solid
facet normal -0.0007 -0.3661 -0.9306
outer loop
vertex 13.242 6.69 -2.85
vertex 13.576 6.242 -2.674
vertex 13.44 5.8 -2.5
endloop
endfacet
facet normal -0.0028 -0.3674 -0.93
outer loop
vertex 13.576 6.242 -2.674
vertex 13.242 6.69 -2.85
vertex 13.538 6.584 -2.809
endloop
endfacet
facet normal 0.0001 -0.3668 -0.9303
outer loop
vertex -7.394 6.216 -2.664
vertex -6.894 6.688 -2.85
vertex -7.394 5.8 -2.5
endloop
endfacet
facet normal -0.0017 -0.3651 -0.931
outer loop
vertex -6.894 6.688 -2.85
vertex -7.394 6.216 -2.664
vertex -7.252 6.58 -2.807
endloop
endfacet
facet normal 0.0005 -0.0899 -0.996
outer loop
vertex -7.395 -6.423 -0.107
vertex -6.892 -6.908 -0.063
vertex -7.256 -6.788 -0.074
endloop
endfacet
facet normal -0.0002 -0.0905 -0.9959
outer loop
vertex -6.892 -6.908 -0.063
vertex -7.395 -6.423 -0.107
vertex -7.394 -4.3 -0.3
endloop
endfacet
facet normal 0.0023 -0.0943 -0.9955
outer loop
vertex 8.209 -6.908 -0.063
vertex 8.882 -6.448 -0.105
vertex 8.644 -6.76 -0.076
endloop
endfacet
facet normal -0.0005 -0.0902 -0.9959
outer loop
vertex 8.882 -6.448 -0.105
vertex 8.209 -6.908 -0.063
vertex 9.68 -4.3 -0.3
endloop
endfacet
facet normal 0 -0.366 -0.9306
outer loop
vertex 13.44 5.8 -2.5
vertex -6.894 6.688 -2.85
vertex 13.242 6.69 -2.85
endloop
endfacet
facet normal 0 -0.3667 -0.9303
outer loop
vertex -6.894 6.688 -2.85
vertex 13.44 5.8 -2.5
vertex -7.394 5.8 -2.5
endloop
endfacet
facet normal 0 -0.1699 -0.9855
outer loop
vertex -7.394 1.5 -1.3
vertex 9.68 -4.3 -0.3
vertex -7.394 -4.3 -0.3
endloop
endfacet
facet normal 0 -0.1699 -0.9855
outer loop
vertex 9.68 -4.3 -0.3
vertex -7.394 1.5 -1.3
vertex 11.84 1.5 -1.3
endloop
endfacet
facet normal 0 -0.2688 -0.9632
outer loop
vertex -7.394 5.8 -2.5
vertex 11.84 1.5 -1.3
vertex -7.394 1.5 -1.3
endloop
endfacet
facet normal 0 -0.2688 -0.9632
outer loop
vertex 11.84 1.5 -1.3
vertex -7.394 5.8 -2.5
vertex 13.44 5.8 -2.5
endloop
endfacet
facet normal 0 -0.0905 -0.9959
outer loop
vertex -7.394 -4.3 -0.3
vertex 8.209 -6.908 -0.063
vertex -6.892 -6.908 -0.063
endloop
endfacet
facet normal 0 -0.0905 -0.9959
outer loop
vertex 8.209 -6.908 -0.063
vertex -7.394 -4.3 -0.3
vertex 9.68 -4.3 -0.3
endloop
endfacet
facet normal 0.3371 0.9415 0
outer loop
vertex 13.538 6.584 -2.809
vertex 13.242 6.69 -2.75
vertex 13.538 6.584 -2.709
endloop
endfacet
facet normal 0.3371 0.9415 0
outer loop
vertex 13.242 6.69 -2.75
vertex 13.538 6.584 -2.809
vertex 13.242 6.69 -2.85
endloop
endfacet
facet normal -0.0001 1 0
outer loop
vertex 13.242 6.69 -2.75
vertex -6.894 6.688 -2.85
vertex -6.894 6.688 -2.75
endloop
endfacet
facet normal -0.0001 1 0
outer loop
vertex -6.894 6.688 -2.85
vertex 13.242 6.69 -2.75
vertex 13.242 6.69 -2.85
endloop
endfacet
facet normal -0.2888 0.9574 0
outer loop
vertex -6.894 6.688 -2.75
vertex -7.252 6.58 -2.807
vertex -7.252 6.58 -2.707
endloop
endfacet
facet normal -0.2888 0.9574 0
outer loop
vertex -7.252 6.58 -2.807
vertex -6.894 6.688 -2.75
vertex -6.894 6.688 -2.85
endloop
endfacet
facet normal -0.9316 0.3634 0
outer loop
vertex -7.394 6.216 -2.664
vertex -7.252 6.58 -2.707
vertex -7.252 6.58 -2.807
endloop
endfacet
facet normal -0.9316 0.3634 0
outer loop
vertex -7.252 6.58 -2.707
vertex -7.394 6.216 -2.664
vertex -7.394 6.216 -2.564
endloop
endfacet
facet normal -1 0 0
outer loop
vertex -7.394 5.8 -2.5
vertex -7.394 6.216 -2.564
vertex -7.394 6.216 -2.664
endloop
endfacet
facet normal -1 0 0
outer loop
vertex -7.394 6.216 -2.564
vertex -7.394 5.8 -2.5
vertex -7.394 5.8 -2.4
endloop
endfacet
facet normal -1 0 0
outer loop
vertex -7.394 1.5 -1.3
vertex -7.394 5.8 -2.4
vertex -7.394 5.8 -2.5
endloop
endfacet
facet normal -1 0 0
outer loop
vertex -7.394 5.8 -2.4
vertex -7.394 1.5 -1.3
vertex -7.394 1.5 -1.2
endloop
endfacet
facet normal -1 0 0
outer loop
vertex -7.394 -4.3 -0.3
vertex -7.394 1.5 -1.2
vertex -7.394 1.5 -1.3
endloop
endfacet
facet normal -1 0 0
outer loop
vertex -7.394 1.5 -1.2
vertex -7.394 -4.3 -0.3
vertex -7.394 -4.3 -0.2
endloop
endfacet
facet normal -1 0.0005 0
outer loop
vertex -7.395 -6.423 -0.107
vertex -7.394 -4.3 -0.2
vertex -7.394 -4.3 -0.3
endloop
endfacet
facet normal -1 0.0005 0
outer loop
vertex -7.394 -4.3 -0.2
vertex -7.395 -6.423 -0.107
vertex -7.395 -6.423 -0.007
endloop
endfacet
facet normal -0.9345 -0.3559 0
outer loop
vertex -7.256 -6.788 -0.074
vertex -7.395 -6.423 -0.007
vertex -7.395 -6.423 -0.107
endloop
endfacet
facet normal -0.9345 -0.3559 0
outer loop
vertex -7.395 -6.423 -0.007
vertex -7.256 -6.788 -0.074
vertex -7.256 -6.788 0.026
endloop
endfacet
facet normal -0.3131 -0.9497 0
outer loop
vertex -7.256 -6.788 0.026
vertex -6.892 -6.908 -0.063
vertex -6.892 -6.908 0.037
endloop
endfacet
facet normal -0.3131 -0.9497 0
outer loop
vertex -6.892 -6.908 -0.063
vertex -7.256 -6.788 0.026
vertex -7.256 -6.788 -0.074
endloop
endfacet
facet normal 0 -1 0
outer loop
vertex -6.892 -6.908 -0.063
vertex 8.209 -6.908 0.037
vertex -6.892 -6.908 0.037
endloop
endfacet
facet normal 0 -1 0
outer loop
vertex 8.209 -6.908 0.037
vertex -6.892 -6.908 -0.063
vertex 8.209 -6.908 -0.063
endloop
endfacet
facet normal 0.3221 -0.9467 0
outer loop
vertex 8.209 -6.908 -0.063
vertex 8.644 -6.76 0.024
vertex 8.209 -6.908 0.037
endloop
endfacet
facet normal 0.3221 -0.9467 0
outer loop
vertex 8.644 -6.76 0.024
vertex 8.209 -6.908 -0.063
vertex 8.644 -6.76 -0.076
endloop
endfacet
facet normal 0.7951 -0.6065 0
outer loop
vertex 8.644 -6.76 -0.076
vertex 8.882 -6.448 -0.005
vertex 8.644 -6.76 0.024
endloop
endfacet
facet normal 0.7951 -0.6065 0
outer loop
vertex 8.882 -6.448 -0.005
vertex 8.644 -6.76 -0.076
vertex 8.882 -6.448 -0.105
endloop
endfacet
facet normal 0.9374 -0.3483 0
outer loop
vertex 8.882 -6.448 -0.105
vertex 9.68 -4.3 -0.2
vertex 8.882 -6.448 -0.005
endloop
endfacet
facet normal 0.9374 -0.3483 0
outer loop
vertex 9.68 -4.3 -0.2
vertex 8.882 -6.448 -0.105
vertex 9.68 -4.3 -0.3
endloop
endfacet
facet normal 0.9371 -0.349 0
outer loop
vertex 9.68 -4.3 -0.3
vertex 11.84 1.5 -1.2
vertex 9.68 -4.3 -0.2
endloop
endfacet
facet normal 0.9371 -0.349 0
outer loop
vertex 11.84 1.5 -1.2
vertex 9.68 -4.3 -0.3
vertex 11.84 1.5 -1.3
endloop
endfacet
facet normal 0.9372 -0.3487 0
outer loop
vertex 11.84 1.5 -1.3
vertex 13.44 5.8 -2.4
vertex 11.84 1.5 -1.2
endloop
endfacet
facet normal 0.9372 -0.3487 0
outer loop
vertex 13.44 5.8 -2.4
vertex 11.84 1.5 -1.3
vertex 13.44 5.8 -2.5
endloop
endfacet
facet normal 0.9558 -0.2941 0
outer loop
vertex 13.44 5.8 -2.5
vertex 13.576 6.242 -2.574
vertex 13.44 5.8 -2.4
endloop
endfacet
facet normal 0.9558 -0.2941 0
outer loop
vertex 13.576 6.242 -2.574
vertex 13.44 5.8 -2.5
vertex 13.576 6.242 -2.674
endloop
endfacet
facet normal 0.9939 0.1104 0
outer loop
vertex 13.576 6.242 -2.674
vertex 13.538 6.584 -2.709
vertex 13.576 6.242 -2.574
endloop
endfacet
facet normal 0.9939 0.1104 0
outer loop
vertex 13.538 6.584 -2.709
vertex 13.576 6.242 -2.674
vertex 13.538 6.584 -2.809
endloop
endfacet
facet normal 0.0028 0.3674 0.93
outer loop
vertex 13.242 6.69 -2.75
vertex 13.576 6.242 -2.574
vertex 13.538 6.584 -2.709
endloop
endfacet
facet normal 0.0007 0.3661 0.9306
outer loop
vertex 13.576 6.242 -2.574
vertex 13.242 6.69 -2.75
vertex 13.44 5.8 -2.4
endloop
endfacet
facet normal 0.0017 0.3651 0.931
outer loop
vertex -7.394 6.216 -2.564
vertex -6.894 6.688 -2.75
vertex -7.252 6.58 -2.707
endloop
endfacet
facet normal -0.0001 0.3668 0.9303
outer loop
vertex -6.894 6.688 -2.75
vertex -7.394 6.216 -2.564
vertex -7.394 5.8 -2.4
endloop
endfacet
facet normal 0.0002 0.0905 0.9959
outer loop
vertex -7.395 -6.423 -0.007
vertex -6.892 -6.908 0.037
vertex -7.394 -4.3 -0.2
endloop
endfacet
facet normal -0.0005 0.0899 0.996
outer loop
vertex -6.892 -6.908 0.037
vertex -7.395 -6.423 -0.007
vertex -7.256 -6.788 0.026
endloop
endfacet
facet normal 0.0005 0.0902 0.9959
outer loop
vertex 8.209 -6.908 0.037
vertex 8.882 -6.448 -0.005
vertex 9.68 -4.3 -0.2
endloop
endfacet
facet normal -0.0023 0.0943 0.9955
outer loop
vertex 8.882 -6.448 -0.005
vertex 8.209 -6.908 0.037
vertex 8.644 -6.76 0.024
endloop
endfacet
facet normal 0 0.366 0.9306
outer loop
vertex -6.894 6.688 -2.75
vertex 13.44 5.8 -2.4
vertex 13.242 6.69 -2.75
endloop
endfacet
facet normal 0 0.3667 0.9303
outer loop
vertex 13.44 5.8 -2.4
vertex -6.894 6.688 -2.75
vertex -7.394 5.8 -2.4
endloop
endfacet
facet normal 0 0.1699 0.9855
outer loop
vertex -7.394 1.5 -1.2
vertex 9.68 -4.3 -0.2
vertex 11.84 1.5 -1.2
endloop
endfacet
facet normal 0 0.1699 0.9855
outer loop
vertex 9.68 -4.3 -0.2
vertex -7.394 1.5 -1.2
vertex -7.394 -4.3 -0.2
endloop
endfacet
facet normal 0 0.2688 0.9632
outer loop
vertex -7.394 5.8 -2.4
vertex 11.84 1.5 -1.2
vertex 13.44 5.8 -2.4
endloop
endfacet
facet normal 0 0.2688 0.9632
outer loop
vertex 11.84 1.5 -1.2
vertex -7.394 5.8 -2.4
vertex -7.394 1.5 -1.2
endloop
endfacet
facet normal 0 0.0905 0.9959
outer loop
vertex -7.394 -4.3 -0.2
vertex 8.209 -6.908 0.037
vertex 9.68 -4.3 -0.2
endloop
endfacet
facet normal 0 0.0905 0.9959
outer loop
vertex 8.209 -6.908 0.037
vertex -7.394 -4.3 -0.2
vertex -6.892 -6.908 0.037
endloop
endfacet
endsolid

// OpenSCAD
// file: s/13710ks04.scad
use <../../lib.scad>
function ldraw_lib__s__13710ks04() = [
// 0 ~Sticker Top for Technic Beam  3 with Panel Fairing (Formed)
// 0 Name: s\13710ks04.dat
// 0 Author: Philippe Hurbain [Philo]
// 0 !LDRAW_ORG Subpart UPDATE 2022-03
// 0 !LICENSE Licensed under CC BY 2.0 and CC BY 4.0 : see CAreadme.txt
// 
// 0 BFC CERTIFY CCW
  [0,"BFC","CERTIFY"],
  [0,"BFC","CCW"],
// 
// 0 !HISTORY 2022-05-07 [PTadmin] Official Update 2022-03
// 
// 
// 0 // Top surface
// 
// 4 16 33.94 6.435 15.604 33.845 6.772 16.459 33.105 6.876 16.725 33.6 6 14.5
  [4,16,33.94,6.435,15.604,33.845,6.772,16.459,33.105,6.876,16.725,33.6,6,14.5],
// 4 16 -17.236 6.875 16.721 -18.13 6.768 16.45 -18.484 6.409 15.539 -18.484 6 14.5
  [4,16,-17.236,6.875,16.721,-18.13,6.768,16.45,-18.484,6.409,15.539,-18.484,6,14.5],
// 4 16 -18.487 0.017 -16.058 -18.14 -0.066 -16.971 -17.23 -0.093 -17.27 -18.484 0.5 -10.75
  [4,16,-18.487,0.017,-16.058,-18.14,-0.066,-16.971,-17.23,-0.093,-17.27,-18.484,0.5,-10.75],
// 4 16 20.522 -0.093 -17.269 21.61 -0.059 -16.899 22.205 0.012 -16.121 24.2 0.5 -10.75
  [4,16,20.522,-0.093,-17.269,21.61,-0.059,-16.899,22.205,0.012,-16.121,24.2,0.5,-10.75],
// 4 16 33.6 6 14.5 33.105 6.876 16.725 -17.236 6.875 16.721 -18.484 6 14.5
  [4,16,33.6,6,14.5,33.105,6.876,16.725,-17.236,6.875,16.721,-18.484,6,14.5],
// 4 16 -18.484 0.5 -10.75 24.2 0.5 -10.75 29.6 3 3.75 -18.484 3 3.75
  [4,16,-18.484,0.5,-10.75,24.2,0.5,-10.75,29.6,3,3.75,-18.484,3,3.75],
// 4 16 33.6 6 14.5 -18.484 6 14.5 -18.484 3 3.75 29.6 3 3.75
  [4,16,33.6,6,14.5,-18.484,6,14.5,-18.484,3,3.75,29.6,3,3.75],
// 4 16 24.2 0.5 -10.75 -18.484 0.5 -10.75 -17.23 -0.093 -17.27 20.522 -0.093 -17.269
  [4,16,24.2,0.5,-10.75,-18.484,0.5,-10.75,-17.23,-0.093,-17.27,20.522,-0.093,-17.269],
// 5 24 -18.484 6 14.5 33.6 6 14.5 33.105 6.876 16.725 -18.484 3 3.75
  [5,24,-18.484,6,14.5,33.6,6,14.5,33.105,6.876,16.725,-18.484,3,3.75],
// 5 24 -18.484 0.5 -10.75 24.2 0.5 -10.75 29.6 3 3.75 -17.23 -0.093 -17.27
  [5,24,-18.484,0.5,-10.75,24.2,0.5,-10.75,29.6,3,3.75,-17.23,-0.093,-17.27],
// 5 24 29.6 3 3.75 -18.484 3 3.75 -18.484 0.5 -10.75 33.6 6 14.5
  [5,24,29.6,3,3.75,-18.484,3,3.75,-18.484,0.5,-10.75,33.6,6,14.5],
];
makepoly(ldraw_lib__s__13710ks04(), line=0.2);
// file: s/13710ks03.scad
use <../../lib.scad>
use <13710ks04.scad>
function ldraw_lib__s__13710ks03() = [
// 0 ~Sticker Bottom for Technic Beam  3 with Panel Fairing (Formed)
// 0 Name: s\13710ks03.dat
// 0 Author: Philippe Hurbain [Philo]
// 0 !LDRAW_ORG Subpart UPDATE 2022-03
// 0 !LICENSE Licensed under CC BY 2.0 and CC BY 4.0 : see CAreadme.txt
// 
// 0 BFC CERTIFY CCW
  [0,"BFC","CERTIFY"],
  [0,"BFC","CCW"],
// 
// 0 !HISTORY 2022-05-07 [PTadmin] Official Update 2022-03
// 
// 
// 0 // Bottom surface
// 
// 0 BFC INVERTNEXT
  [0,"BFC","INVERTNEXT"],
// 1 16 0 0.25 0 1 0 0 0 1 0 0 0 1 s\13710ks04.dat
  [1,16,0,0.25,0,1,0,0,0,1,0,0,0,1, ldraw_lib__s__13710ks04()],
// 0 // Edge surface
// 4 16 33.845 7.022 16.459 33.105 7.126 16.725 33.105 6.876 16.725 33.845 6.772 16.459
  [4,16,33.845,7.022,16.459,33.105,7.126,16.725,33.105,6.876,16.725,33.845,6.772,16.459],
// 4 16 33.105 7.126 16.725 -17.236 7.125 16.721 -17.236 6.875 16.721 33.105 6.876 16.725
  [4,16,33.105,7.126,16.725,-17.236,7.125,16.721,-17.236,6.875,16.721,33.105,6.876,16.725],
// 4 16 -17.236 7.125 16.721 -18.13 7.018 16.45 -18.13 6.768 16.45 -17.236 6.875 16.721
  [4,16,-17.236,7.125,16.721,-18.13,7.018,16.45,-18.13,6.768,16.45,-17.236,6.875,16.721],
// 4 16 -18.13 7.018 16.45 -18.484 6.659 15.539 -18.484 6.409 15.539 -18.13 6.768 16.45
  [4,16,-18.13,7.018,16.45,-18.484,6.659,15.539,-18.484,6.409,15.539,-18.13,6.768,16.45],
// 4 16 -18.484 6.659 15.539 -18.484 6.25 14.5 -18.484 6 14.5 -18.484 6.409 15.539
  [4,16,-18.484,6.659,15.539,-18.484,6.25,14.5,-18.484,6,14.5,-18.484,6.409,15.539],
// 4 16 -18.484 6.25 14.5 -18.484 3.25 3.75 -18.484 3 3.75 -18.484 6 14.5
  [4,16,-18.484,6.25,14.5,-18.484,3.25,3.75,-18.484,3,3.75,-18.484,6,14.5],
// 4 16 -18.484 3.25 3.75 -18.484 0.75 -10.75 -18.484 0.5 -10.75 -18.484 3 3.75
  [4,16,-18.484,3.25,3.75,-18.484,0.75,-10.75,-18.484,0.5,-10.75,-18.484,3,3.75],
// 4 16 -18.484 0.75 -10.75 -18.487 0.267 -16.058 -18.487 0.017 -16.058 -18.484 0.5 -10.75
  [4,16,-18.484,0.75,-10.75,-18.487,0.267,-16.058,-18.487,0.017,-16.058,-18.484,0.5,-10.75],
// 4 16 -18.487 0.267 -16.058 -18.14 0.184 -16.971 -18.14 -0.066 -16.971 -18.487 0.017 -16.058
  [4,16,-18.487,0.267,-16.058,-18.14,0.184,-16.971,-18.14,-0.066,-16.971,-18.487,0.017,-16.058],
// 4 16 -18.14 0.184 -16.971 -17.23 0.157 -17.27 -17.23 -0.093 -17.27 -18.14 -0.066 -16.971
  [4,16,-18.14,0.184,-16.971,-17.23,0.157,-17.27,-17.23,-0.093,-17.27,-18.14,-0.066,-16.971],
// 4 16 -17.23 0.157 -17.27 20.522 0.157 -17.269 20.522 -0.093 -17.269 -17.23 -0.093 -17.27
  [4,16,-17.23,0.157,-17.27,20.522,0.157,-17.269,20.522,-0.093,-17.269,-17.23,-0.093,-17.27],
// 4 16 20.522 0.157 -17.269 21.61 0.191 -16.899 21.61 -0.059 -16.899 20.522 -0.093 -17.269
  [4,16,20.522,0.157,-17.269,21.61,0.191,-16.899,21.61,-0.059,-16.899,20.522,-0.093,-17.269],
// 4 16 21.61 0.191 -16.899 22.205 0.262 -16.121 22.205 0.012 -16.121 21.61 -0.059 -16.899
  [4,16,21.61,0.191,-16.899,22.205,0.262,-16.121,22.205,0.012,-16.121,21.61,-0.059,-16.899],
// 4 16 22.205 0.262 -16.121 24.2 0.75 -10.75 24.2 0.5 -10.75 22.205 0.012 -16.121
  [4,16,22.205,0.262,-16.121,24.2,0.75,-10.75,24.2,0.5,-10.75,22.205,0.012,-16.121],
// 4 16 24.2 0.75 -10.75 29.6 3.25 3.75 29.6 3 3.75 24.2 0.5 -10.75
  [4,16,24.2,0.75,-10.75,29.6,3.25,3.75,29.6,3,3.75,24.2,0.5,-10.75],
// 4 16 29.6 3.25 3.75 33.6 6.25 14.5 33.6 6 14.5 29.6 3 3.75
  [4,16,29.6,3.25,3.75,33.6,6.25,14.5,33.6,6,14.5,29.6,3,3.75],
// 4 16 33.6 6.25 14.5 33.94 6.685 15.604 33.94 6.435 15.604 33.6 6 14.5
  [4,16,33.6,6.25,14.5,33.94,6.685,15.604,33.94,6.435,15.604,33.6,6,14.5],
// 4 16 33.94 6.685 15.604 33.845 7.022 16.459 33.845 6.772 16.459 33.94 6.435 15.604
  [4,16,33.94,6.685,15.604,33.845,7.022,16.459,33.845,6.772,16.459,33.94,6.435,15.604],
// 5 24 33.105 7.126 16.725 33.105 6.876 16.725 33.845 7.022 16.459 -17.236 7.125 16.721
  [5,24,33.105,7.126,16.725,33.105,6.876,16.725,33.845,7.022,16.459,-17.236,7.125,16.721],
// 5 24 33.845 6.772 16.459 33.845 7.022 16.459 33.105 7.126 16.725 33.94 6.685 15.604
  [5,24,33.845,6.772,16.459,33.845,7.022,16.459,33.105,7.126,16.725,33.94,6.685,15.604],
// 5 24 -17.236 7.125 16.721 -17.236 6.875 16.721 33.105 7.126 16.725 -18.13 7.018 16.45
  [5,24,-17.236,7.125,16.721,-17.236,6.875,16.721,33.105,7.126,16.725,-18.13,7.018,16.45],
// 5 24 -18.13 7.018 16.45 -18.13 6.768 16.45 -17.236 7.125 16.721 -18.484 6.659 15.539
  [5,24,-18.13,7.018,16.45,-18.13,6.768,16.45,-17.236,7.125,16.721,-18.484,6.659,15.539],
// 5 24 -18.484 6.659 15.539 -18.484 6.409 15.539 -18.13 7.018 16.45 -18.484 6.25 14.5
  [5,24,-18.484,6.659,15.539,-18.484,6.409,15.539,-18.13,7.018,16.45,-18.484,6.25,14.5],
// 5 24 -18.487 0.267 -16.058 -18.487 0.017 -16.058 -18.484 0.75 -10.75 -18.14 0.184 -16.971
  [5,24,-18.487,0.267,-16.058,-18.487,0.017,-16.058,-18.484,0.75,-10.75,-18.14,0.184,-16.971],
// 5 24 -18.14 0.184 -16.971 -18.14 -0.066 -16.971 -18.487 0.267 -16.058 -17.23 0.157 -17.27
  [5,24,-18.14,0.184,-16.971,-18.14,-0.066,-16.971,-18.487,0.267,-16.058,-17.23,0.157,-17.27],
// 5 24 -17.23 0.157 -17.27 -17.23 -0.093 -17.27 -18.14 0.184 -16.971 20.522 0.157 -17.269
  [5,24,-17.23,0.157,-17.27,-17.23,-0.093,-17.27,-18.14,0.184,-16.971,20.522,0.157,-17.269],
// 5 24 20.522 0.157 -17.269 20.522 -0.093 -17.269 -17.23 0.157 -17.27 21.61 0.191 -16.899
  [5,24,20.522,0.157,-17.269,20.522,-0.093,-17.269,-17.23,0.157,-17.27,21.61,0.191,-16.899],
// 5 24 21.61 0.191 -16.899 21.61 -0.059 -16.899 20.522 0.157 -17.269 22.205 0.262 -16.121
  [5,24,21.61,0.191,-16.899,21.61,-0.059,-16.899,20.522,0.157,-17.269,22.205,0.262,-16.121],
// 5 24 22.205 0.262 -16.121 22.205 0.012 -16.121 21.61 0.191 -16.899 24.2 0.75 -10.75
  [5,24,22.205,0.262,-16.121,22.205,0.012,-16.121,21.61,0.191,-16.899,24.2,0.75,-10.75],
// 5 24 33.6 6.25 14.5 33.6 6 14.5 29.6 3.25 3.75 33.94 6.685 15.604
  [5,24,33.6,6.25,14.5,33.6,6,14.5,29.6,3.25,3.75,33.94,6.685,15.604],
// 5 24 33.94 6.685 15.604 33.94 6.435 15.604 33.6 6.25 14.5 33.845 7.022 16.459
  [5,24,33.94,6.685,15.604,33.94,6.435,15.604,33.6,6.25,14.5,33.845,7.022,16.459],
];
makepoly(ldraw_lib__s__13710ks03(), line=0.2);
// main file
use <../lib.scad>
use <s/13710ks03.scad>
use <s/13710ks04.scad>
function ldraw_lib__13710lc01() = [
// 0 Sticker Mindstorms EV3 #12 for Beam 3 / Fairing Left (Formed) (Needs Work)
// 0 Name: 13710lc01.dat
// 0 Author: Philippe Hurbain [Philo]
// 0 !LDRAW_ORG Part UPDATE 2022-03
// 0 !LICENSE Licensed under CC BY 2.0 and CC BY 4.0 : see CAreadme.txt
// 
// 0 !HELP To be used with panel 61071
// 0 !HELP 1 15 20 30 -65 1 0 0 0 0 -1 0 1 0 13710lc01.dat
// 
// 0 BFC CERTIFY CCW
  [0,"BFC","CERTIFY"],
  [0,"BFC","CCW"],
// 
// 0 !HISTORY 2022-05-07 [PTadmin] Official Update 2022-03
// 
// 
// 0 // Image file courtesy of the LEGO MINDSTORMS Team
// 0 // Needs Work: Missing more detailed fallback pattern
// 
// 1 16 0 0 0 1 0 0 0 1 0 0 0 1 s\13710ks03.dat
  [1,16,0,0,0,1,0,0,0,1,0,0,0,1, ldraw_lib__s__13710ks03()],
// 0 !TEXMAP START PLANAR -18.484 10 16.725 33.94 10 16.725 -18.484 10 -17.27 13710l.png
// 0 !: 1 15 0 0 0 1 0 0 0 1 0 0 0 1 s\13710ks04.dat
// 0 !TEXMAP FALLBACK
// 1 15 0 0 0 1 0 0 0 1 0 0 0 1 s\13710ks04.dat
  [1,15,0,0,0,1,0,0,0,1,0,0,0,1, ldraw_lib__s__13710ks04()],
// 0 !TEXMAP END
];
makepoly(ldraw_lib__13710lc01(), line=0.2);
